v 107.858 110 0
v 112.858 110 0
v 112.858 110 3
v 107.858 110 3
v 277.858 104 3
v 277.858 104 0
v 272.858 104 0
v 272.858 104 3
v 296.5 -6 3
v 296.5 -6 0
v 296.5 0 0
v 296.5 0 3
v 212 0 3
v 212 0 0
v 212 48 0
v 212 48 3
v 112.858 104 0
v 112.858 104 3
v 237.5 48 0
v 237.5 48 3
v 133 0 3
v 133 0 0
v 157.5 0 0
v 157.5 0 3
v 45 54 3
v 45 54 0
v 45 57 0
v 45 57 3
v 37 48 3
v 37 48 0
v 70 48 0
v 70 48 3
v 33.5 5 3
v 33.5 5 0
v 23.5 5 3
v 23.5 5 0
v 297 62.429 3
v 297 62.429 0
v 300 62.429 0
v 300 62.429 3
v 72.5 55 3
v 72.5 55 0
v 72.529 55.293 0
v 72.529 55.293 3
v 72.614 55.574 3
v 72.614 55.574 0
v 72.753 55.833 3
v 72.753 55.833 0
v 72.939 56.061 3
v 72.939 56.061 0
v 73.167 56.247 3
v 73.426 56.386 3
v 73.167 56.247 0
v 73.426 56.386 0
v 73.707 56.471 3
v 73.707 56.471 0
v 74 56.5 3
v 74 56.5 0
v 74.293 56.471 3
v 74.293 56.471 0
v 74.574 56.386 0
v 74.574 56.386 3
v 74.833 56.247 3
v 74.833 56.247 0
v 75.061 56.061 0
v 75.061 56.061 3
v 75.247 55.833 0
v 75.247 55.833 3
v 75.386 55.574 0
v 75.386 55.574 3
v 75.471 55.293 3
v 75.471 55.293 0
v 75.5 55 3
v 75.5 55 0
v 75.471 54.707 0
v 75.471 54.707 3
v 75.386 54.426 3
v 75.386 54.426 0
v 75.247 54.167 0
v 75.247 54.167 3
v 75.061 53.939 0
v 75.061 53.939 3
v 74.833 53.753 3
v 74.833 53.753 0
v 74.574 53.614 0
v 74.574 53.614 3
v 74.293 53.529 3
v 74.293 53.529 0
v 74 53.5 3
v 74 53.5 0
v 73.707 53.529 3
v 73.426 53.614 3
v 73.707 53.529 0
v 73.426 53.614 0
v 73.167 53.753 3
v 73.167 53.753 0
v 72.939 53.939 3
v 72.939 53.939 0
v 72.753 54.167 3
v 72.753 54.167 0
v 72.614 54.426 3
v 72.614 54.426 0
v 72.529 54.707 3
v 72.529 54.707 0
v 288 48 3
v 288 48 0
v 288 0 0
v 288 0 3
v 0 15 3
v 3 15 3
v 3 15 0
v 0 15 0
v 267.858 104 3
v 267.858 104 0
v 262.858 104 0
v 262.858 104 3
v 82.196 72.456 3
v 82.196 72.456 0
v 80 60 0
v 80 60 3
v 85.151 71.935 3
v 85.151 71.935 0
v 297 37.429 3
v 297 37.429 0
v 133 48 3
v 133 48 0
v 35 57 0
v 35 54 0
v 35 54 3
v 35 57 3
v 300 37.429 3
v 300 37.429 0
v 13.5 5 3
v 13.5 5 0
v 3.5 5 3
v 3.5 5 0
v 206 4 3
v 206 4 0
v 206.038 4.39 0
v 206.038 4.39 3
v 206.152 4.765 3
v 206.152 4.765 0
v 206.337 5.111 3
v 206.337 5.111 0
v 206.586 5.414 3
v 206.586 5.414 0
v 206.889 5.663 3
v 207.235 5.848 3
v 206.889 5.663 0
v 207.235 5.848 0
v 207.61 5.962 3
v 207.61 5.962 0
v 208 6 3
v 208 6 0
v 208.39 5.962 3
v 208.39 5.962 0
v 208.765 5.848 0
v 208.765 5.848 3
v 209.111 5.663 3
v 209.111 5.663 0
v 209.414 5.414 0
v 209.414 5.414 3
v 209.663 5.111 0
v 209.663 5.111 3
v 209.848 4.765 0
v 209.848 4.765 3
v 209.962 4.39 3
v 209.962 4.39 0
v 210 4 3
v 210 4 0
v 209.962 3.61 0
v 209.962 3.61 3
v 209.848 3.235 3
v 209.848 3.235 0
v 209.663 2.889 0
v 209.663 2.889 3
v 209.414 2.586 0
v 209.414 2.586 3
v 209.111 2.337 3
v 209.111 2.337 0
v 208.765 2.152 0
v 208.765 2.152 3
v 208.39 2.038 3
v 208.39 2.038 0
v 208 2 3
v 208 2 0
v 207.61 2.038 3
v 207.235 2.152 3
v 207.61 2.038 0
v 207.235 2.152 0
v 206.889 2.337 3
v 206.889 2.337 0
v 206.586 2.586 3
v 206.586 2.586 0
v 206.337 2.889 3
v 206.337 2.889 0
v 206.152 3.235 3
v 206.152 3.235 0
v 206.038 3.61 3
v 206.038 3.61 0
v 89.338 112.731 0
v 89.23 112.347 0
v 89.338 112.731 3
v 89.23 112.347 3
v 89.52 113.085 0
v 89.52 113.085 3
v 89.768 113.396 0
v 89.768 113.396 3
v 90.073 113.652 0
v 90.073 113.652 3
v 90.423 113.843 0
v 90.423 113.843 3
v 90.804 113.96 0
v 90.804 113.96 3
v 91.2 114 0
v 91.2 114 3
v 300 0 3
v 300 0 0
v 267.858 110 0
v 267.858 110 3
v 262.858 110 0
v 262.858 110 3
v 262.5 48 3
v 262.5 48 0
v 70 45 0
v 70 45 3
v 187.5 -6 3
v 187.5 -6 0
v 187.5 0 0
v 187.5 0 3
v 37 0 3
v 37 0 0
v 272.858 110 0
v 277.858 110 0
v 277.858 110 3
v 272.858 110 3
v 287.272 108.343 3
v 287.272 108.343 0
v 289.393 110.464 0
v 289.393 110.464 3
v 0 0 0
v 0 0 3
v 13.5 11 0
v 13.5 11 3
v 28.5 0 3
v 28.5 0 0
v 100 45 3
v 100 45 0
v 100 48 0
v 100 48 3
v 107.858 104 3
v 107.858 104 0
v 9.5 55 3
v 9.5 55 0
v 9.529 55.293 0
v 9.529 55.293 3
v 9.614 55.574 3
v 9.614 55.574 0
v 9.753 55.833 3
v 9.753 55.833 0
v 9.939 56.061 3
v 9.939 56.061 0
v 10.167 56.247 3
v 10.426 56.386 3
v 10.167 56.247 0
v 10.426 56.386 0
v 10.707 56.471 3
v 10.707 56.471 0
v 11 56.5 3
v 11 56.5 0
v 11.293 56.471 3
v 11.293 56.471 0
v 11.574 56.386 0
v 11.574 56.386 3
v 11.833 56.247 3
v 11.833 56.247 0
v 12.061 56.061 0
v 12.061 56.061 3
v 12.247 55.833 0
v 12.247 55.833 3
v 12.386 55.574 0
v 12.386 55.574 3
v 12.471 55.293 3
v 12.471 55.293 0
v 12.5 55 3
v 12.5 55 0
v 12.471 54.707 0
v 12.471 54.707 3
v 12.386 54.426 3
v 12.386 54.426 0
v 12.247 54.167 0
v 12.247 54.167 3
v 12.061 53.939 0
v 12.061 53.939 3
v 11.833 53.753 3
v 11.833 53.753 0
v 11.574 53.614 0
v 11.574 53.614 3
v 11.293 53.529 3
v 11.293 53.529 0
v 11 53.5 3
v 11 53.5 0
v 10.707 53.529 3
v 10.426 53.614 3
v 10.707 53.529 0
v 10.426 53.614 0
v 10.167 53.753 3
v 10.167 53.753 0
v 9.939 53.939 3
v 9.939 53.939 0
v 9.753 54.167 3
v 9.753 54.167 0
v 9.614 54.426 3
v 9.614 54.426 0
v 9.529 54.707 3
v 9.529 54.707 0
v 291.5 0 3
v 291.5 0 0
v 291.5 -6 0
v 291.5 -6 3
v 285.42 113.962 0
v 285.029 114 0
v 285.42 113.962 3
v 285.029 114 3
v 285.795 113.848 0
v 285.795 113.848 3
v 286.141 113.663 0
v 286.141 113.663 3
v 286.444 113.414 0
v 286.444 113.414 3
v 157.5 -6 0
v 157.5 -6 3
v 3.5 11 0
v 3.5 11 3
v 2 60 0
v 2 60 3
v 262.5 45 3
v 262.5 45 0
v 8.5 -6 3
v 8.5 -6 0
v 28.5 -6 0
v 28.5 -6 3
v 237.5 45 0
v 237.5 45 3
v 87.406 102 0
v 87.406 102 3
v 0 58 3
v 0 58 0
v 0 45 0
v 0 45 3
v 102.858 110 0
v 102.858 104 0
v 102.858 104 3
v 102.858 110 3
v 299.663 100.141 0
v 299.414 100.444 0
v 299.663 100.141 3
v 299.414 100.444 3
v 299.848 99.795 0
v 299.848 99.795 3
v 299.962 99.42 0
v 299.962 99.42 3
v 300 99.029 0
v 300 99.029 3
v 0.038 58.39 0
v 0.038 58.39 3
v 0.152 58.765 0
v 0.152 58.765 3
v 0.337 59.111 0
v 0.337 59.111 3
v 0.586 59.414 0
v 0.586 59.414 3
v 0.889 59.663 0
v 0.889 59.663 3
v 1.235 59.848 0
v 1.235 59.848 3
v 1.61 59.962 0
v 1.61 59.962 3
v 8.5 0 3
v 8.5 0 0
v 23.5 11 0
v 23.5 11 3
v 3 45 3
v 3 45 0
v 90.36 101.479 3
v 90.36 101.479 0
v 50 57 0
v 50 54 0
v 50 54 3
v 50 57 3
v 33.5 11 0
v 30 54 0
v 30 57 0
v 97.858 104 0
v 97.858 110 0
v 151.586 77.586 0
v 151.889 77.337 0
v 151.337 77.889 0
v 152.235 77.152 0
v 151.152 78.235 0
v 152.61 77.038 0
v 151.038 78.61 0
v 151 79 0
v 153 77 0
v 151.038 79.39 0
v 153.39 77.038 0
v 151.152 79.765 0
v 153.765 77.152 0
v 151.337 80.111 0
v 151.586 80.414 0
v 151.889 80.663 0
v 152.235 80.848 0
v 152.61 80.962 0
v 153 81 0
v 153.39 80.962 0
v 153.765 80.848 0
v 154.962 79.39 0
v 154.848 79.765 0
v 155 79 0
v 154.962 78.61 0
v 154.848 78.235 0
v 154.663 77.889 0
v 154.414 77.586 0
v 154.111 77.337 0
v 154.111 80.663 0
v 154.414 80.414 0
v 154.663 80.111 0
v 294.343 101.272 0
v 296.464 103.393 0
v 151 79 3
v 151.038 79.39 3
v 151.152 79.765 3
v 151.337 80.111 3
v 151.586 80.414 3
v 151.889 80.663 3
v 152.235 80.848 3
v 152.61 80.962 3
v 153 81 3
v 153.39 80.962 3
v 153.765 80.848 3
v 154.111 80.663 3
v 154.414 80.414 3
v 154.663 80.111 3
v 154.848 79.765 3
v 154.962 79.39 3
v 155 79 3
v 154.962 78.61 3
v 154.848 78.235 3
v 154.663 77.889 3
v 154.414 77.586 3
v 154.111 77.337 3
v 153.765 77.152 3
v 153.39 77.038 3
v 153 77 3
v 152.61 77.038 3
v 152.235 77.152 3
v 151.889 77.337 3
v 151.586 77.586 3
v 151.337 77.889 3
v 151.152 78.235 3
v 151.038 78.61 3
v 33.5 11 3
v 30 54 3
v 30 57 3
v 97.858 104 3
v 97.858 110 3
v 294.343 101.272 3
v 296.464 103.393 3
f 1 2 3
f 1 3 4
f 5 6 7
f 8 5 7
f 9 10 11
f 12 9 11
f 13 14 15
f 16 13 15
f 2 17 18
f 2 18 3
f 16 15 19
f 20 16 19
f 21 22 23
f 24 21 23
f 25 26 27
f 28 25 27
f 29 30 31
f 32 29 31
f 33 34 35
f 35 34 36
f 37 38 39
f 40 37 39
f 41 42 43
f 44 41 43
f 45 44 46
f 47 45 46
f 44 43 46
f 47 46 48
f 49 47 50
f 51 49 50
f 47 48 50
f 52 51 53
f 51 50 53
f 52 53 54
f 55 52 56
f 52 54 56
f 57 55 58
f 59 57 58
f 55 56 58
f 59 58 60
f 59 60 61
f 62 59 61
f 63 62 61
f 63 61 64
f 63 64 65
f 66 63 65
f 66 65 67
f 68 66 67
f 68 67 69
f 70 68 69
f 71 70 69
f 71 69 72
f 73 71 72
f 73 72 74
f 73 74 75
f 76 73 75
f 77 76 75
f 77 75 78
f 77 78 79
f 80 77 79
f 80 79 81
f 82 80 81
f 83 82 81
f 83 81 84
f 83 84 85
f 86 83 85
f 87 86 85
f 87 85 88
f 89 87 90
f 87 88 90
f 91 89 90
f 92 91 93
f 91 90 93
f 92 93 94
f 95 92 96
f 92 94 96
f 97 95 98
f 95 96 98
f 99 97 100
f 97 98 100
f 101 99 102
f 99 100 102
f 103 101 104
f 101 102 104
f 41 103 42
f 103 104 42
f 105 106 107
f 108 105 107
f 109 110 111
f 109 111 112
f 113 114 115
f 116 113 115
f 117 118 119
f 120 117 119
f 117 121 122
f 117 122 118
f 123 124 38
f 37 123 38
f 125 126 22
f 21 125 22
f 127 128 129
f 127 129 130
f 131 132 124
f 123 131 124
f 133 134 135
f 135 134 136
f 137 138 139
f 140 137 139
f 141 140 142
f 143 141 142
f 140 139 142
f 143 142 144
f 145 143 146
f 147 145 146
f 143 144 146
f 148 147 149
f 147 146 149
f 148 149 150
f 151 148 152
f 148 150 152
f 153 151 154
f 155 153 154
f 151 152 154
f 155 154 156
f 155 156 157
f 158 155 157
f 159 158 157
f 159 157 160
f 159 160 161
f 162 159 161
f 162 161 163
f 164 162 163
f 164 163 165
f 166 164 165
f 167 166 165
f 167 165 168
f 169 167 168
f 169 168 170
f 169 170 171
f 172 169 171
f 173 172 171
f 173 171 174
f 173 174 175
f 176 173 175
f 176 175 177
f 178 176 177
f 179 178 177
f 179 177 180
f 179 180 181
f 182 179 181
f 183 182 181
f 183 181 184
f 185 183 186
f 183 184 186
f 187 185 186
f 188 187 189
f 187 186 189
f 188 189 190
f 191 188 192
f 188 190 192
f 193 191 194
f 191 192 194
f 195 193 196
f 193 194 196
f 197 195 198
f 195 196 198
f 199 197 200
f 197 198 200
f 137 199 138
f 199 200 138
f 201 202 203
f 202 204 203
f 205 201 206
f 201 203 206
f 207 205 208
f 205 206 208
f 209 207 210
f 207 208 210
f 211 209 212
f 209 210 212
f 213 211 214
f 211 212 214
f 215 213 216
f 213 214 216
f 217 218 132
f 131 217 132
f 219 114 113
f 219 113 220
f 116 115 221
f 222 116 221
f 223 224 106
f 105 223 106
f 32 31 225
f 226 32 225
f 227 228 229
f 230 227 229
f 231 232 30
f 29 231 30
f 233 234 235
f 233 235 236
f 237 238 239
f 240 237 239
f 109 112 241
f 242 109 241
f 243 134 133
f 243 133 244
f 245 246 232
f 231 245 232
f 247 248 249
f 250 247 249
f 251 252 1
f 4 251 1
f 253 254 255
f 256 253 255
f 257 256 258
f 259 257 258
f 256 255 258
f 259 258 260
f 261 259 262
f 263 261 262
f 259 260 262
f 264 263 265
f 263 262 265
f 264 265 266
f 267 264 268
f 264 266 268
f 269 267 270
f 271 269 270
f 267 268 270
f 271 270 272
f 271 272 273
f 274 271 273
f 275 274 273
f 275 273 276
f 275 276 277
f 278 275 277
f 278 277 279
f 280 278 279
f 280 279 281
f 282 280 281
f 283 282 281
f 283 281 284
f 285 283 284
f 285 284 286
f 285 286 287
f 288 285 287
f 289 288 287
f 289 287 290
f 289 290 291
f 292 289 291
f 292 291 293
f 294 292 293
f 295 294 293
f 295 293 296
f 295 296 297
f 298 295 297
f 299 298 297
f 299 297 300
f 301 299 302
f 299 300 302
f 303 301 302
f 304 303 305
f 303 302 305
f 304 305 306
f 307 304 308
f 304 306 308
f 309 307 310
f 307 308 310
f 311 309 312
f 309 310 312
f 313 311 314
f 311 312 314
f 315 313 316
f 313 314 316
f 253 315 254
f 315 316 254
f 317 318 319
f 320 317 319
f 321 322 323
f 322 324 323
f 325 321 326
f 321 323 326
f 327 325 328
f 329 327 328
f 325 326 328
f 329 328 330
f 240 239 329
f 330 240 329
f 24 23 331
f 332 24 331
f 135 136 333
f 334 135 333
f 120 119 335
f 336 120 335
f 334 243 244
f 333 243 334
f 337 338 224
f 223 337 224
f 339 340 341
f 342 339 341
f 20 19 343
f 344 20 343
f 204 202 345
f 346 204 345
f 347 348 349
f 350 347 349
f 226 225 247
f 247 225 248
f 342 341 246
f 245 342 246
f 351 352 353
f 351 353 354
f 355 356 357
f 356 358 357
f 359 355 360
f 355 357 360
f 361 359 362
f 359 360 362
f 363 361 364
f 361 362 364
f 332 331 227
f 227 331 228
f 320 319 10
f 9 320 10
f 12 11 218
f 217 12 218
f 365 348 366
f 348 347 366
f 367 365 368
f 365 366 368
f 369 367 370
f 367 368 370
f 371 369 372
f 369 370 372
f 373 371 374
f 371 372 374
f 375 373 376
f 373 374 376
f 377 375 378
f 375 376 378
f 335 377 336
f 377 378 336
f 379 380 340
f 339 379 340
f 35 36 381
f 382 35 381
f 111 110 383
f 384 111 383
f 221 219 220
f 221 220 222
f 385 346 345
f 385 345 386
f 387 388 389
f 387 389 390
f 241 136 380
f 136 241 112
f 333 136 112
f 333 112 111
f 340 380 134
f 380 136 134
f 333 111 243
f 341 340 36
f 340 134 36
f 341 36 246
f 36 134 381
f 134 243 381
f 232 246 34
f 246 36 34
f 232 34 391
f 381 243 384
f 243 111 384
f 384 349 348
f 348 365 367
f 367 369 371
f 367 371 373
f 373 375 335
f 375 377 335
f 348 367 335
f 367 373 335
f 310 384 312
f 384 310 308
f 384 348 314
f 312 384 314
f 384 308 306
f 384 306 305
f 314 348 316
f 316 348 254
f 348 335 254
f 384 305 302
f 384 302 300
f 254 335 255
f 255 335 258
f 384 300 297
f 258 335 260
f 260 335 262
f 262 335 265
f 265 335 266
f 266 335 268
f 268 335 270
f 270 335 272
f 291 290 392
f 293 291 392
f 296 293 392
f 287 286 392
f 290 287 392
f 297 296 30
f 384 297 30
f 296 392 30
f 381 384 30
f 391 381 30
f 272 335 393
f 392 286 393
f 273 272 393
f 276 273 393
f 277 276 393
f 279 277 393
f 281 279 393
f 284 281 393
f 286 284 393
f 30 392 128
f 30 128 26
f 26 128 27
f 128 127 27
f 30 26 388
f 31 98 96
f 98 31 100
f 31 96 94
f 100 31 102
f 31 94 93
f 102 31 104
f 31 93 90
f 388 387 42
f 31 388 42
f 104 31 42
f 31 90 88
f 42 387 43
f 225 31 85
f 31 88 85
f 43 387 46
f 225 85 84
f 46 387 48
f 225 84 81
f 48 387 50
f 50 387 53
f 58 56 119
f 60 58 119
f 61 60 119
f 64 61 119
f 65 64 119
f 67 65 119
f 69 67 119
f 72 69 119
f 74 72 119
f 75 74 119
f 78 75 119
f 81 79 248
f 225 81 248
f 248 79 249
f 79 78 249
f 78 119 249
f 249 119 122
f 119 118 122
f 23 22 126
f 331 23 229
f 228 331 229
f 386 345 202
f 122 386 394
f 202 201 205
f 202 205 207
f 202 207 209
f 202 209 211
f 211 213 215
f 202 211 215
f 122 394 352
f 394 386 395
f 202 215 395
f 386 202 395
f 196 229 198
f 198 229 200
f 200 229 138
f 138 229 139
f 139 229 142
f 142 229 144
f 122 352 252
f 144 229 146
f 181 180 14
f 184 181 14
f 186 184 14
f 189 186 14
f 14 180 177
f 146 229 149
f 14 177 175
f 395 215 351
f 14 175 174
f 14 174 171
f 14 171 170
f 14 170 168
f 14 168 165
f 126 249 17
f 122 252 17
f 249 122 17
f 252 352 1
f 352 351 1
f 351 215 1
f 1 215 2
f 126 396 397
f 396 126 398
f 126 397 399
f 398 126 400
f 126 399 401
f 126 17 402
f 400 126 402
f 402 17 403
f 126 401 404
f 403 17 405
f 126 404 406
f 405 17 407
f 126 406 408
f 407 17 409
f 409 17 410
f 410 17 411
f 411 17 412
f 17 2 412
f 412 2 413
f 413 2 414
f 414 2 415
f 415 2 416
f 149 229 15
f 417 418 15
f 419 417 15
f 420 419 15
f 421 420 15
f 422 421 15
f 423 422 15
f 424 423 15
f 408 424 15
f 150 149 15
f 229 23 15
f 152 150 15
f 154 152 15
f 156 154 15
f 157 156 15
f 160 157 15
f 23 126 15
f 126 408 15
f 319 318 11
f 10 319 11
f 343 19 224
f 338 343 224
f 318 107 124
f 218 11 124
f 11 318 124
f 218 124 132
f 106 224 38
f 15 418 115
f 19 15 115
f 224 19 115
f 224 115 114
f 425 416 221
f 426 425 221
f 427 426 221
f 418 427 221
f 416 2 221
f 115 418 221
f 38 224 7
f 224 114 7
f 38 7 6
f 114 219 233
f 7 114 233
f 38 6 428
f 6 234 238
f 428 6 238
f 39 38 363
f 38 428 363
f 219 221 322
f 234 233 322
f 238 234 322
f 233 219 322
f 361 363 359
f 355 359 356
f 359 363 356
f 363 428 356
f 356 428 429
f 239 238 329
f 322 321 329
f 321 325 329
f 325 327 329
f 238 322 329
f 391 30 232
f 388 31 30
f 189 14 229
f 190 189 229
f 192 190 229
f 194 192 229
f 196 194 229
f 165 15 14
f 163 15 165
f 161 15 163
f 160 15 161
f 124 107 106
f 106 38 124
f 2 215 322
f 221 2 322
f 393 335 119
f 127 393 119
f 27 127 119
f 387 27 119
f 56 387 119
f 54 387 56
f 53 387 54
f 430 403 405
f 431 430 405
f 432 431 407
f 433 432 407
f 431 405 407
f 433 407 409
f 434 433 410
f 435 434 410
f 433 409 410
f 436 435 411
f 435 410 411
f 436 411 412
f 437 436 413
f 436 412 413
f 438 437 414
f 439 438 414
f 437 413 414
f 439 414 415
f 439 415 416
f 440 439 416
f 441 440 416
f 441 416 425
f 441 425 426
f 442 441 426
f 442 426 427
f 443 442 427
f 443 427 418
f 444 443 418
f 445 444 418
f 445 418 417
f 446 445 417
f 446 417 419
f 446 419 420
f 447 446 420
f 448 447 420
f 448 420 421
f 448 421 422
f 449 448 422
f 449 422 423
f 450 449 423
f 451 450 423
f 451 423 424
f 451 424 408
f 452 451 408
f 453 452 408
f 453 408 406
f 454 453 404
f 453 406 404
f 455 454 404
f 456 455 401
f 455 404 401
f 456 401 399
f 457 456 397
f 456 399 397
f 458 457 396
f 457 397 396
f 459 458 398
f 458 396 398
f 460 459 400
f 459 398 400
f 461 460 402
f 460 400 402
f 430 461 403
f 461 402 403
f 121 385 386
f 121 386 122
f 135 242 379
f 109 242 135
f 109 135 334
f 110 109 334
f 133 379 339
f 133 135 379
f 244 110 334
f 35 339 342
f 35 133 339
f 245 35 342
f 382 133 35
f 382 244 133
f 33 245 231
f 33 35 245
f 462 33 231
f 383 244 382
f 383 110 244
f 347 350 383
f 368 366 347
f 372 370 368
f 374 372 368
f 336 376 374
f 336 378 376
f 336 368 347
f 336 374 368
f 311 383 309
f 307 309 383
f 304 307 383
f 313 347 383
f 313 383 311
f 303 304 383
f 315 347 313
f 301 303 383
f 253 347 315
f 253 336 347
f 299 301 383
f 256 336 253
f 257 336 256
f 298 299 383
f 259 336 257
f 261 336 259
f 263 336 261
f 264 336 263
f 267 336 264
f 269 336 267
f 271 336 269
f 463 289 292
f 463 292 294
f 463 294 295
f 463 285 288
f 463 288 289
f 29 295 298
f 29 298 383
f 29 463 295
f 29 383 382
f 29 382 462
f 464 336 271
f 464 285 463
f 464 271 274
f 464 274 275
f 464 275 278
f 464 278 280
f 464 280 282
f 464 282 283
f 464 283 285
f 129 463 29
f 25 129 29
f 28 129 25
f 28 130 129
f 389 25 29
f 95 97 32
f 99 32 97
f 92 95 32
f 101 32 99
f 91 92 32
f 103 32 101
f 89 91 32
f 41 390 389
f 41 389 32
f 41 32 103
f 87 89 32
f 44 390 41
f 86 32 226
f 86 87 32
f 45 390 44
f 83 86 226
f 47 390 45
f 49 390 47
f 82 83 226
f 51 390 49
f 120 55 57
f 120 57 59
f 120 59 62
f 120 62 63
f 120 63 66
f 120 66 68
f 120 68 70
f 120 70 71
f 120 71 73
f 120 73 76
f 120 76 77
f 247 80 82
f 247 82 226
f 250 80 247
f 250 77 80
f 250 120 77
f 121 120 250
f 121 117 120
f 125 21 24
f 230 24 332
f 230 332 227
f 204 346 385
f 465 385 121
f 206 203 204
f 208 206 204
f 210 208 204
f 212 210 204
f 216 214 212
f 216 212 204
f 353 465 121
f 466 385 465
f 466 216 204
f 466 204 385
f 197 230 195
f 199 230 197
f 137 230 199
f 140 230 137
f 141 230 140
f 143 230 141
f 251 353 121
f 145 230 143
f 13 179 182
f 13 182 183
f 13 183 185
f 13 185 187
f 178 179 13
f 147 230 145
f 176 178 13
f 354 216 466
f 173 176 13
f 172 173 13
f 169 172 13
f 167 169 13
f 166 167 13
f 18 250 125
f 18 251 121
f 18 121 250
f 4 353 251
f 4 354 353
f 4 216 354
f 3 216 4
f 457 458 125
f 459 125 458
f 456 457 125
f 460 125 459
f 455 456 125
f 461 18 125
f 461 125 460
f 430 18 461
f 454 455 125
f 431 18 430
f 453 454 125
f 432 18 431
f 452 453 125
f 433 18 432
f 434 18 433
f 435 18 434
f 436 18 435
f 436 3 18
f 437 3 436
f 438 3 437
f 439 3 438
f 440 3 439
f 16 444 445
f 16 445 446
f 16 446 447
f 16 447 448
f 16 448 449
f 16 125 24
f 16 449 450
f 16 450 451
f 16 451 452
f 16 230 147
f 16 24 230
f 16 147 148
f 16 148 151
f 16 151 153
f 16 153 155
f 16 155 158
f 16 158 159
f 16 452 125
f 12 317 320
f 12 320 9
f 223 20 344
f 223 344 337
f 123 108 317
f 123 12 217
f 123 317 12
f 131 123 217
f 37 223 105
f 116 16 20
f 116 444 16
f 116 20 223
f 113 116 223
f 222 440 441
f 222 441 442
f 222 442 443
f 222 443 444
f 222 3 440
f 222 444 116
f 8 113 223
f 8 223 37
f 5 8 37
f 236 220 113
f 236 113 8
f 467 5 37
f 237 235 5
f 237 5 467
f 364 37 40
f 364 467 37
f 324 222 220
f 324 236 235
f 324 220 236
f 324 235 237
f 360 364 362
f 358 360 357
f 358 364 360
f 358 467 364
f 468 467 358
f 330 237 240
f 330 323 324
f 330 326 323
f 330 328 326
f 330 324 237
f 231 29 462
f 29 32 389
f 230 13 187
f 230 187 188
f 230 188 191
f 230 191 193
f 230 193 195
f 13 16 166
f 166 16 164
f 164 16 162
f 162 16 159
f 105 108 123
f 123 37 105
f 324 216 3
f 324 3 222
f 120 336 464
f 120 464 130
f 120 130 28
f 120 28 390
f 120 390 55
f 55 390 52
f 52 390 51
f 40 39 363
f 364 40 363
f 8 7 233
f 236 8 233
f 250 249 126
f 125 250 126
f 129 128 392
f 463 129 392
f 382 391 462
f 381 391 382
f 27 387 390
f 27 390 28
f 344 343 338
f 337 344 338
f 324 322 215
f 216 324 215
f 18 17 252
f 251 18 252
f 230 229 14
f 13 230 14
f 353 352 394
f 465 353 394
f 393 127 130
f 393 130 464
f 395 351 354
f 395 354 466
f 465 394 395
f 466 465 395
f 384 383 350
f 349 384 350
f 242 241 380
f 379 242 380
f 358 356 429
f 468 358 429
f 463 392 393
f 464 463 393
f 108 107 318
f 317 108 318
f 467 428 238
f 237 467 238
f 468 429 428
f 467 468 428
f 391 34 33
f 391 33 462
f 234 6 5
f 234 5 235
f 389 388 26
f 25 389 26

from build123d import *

# Parameters (mm, degrees)
BOSS_EXTRUDE1_DEPTH     = 3
SKETCH2_R               = 2
CUT_EXTRUDE1_DEPTH      = 321.943920335
CUT_EXTRUDE2_DEPTH      = 321.943920335
CUT_EXTRUDE2_DEPTH_BACK = 321.943920335
SKETCH3_W               = 3
SKETCH3_H               = 30
SKETCH4_W               = 10
SKETCH4_H               = 6
CUT_EXTRUDE3_DEPTH      = 321.943920335
SKETCH5_R               = 1.5
SKETCH5_W               = 5
SKETCH5_H               = 3
CUT_EXTRUDE4_DEPTH      = 321.943920335
SKETCH6_W               = 5
SKETCH6_H               = 6
CUT_EXTRUDE5_DEPTH      = 321.943920335
FILLET1_R               = 2


with BuildPart() as part:
    # Sketch1 → Boss-Extrude1 (new body)
    with BuildSketch(Plane.XY):
        Polygon((0, 0), (8.5, 0), (8.5, -6), (28.5, -6), (28.5, 0), (37, 0), (37, 48), (70, 48), (70, 45), (100, 45), (100, 48), (133, 48), (133, 0), (157.5, 0), (157.5, -6), (187.5, -6), (187.5, 0), (212, 0), (212, 48), (237.5, 48), (237.5, 45), (262.5, 45), (262.5, 48), (288, 48), (288, 0), (291.5, 0), (291.5, -6), (296.5, -6), (296.5, 0), (300, 0), (300, 37.428932188), (297, 37.428932188), (297, 62.428932188), (300, 62.428932188), (300, 99.857864376), (296.464466094, 103.393398282), (294.343145751, 101.272077939), (287.272077939, 108.343145751), (289.393398282, 110.464466094), (285.857864376, 114), (89.521656958, 114), (80, 60), (0, 60), align=None)
    extrude(amount=BOSS_EXTRUDE1_DEPTH)

    # Sketch2 → Cut-Extrude1 (cut, through all)
    with BuildSketch(Plane(origin=(0, 0, 0), x_dir=(-1, 0, 0), z_dir=(0, 0, -1))):
        with Locations((-208, 4)):
            Circle(SKETCH2_R)
        with Locations((-153, 79)):
            Circle(SKETCH2_R)
    extrude(amount=-CUT_EXTRUDE1_DEPTH, mode=Mode.SUBTRACT)

    # Sketch3 → Cut-Extrude2 (cut, two sides: drawn at the far end of the back side and taken through both)
    with BuildSketch(Plane(origin=(0, 0, 0), x_dir=(-1, 0, 0), z_dir=(0, 0, -1)).offset(-CUT_EXTRUDE2_DEPTH_BACK)):
        Polygon((-87.40573319, 102), (-90.360156449, 101.479055467), (-85.150711119, 71.934822877), (-82.19628786, 72.45576741), align=None)
        with Locations((-1.5, 30)):
            Rectangle(SKETCH3_W, SKETCH3_H)
    extrude(amount=CUT_EXTRUDE2_DEPTH + CUT_EXTRUDE2_DEPTH_BACK, mode=Mode.SUBTRACT)

    # Sketch4 → Cut-Extrude3 (cut, through all)
    with BuildSketch(Plane(origin=(0, 0, 0), x_dir=(-1, 0, 0), z_dir=(0, 0, -1))):
        with Locations((-28.5, 8)):
            Rectangle(SKETCH4_W, SKETCH4_H)
        with Locations((-8.5, 8)):
            Rectangle(SKETCH4_W, SKETCH4_H)
    extrude(amount=-CUT_EXTRUDE3_DEPTH, mode=Mode.SUBTRACT)

    # Sketch5 → Cut-Extrude4 (cut, through all)
    with BuildSketch(Plane(origin=(0, 0, 0), x_dir=(-1, 0, 0), z_dir=(0, 0, -1))):
        with Locations((-11, 55)):
            Circle(SKETCH5_R)
        with Locations((-74, 55)):
            Circle(SKETCH5_R)
        with Locations((-47.5, 55.5)):
            Rectangle(SKETCH5_W, SKETCH5_H)
        with Locations((-32.5, 55.5)):
            Rectangle(SKETCH5_W, SKETCH5_H)
    extrude(amount=-CUT_EXTRUDE4_DEPTH, mode=Mode.SUBTRACT)

    # Sketch6 → Cut-Extrude5 (cut, through all)
    with BuildSketch(Plane(origin=(0, 0, 0), x_dir=(-1, 0, 0), z_dir=(0, 0, -1))):
        with Locations((-275.357864376, 107)):
            Rectangle(SKETCH6_W, SKETCH6_H)
        with Locations((-265.357864376, 107)):
            Rectangle(SKETCH6_W, SKETCH6_H)
        with Locations((-110.357864376, 107)):
            Rectangle(SKETCH6_W, SKETCH6_H)
        with Locations((-100.357864376, 107)):
            Rectangle(SKETCH6_W, SKETCH6_H)
    extrude(amount=-CUT_EXTRUDE5_DEPTH, mode=Mode.SUBTRACT)

    # Fillet1
    fillet1_edges = [part.edges().sort_by_distance(p)[0] for p in [
        (0, 60, 1.5),
        (89.521656958, 114, 1.5),
        (285.857864376, 114, 1.5),
        (300, 99.857864376, 1.5),
    ]]
    fillet(fillet1_edges, radius=FILLET1_R)


solid = part.part
